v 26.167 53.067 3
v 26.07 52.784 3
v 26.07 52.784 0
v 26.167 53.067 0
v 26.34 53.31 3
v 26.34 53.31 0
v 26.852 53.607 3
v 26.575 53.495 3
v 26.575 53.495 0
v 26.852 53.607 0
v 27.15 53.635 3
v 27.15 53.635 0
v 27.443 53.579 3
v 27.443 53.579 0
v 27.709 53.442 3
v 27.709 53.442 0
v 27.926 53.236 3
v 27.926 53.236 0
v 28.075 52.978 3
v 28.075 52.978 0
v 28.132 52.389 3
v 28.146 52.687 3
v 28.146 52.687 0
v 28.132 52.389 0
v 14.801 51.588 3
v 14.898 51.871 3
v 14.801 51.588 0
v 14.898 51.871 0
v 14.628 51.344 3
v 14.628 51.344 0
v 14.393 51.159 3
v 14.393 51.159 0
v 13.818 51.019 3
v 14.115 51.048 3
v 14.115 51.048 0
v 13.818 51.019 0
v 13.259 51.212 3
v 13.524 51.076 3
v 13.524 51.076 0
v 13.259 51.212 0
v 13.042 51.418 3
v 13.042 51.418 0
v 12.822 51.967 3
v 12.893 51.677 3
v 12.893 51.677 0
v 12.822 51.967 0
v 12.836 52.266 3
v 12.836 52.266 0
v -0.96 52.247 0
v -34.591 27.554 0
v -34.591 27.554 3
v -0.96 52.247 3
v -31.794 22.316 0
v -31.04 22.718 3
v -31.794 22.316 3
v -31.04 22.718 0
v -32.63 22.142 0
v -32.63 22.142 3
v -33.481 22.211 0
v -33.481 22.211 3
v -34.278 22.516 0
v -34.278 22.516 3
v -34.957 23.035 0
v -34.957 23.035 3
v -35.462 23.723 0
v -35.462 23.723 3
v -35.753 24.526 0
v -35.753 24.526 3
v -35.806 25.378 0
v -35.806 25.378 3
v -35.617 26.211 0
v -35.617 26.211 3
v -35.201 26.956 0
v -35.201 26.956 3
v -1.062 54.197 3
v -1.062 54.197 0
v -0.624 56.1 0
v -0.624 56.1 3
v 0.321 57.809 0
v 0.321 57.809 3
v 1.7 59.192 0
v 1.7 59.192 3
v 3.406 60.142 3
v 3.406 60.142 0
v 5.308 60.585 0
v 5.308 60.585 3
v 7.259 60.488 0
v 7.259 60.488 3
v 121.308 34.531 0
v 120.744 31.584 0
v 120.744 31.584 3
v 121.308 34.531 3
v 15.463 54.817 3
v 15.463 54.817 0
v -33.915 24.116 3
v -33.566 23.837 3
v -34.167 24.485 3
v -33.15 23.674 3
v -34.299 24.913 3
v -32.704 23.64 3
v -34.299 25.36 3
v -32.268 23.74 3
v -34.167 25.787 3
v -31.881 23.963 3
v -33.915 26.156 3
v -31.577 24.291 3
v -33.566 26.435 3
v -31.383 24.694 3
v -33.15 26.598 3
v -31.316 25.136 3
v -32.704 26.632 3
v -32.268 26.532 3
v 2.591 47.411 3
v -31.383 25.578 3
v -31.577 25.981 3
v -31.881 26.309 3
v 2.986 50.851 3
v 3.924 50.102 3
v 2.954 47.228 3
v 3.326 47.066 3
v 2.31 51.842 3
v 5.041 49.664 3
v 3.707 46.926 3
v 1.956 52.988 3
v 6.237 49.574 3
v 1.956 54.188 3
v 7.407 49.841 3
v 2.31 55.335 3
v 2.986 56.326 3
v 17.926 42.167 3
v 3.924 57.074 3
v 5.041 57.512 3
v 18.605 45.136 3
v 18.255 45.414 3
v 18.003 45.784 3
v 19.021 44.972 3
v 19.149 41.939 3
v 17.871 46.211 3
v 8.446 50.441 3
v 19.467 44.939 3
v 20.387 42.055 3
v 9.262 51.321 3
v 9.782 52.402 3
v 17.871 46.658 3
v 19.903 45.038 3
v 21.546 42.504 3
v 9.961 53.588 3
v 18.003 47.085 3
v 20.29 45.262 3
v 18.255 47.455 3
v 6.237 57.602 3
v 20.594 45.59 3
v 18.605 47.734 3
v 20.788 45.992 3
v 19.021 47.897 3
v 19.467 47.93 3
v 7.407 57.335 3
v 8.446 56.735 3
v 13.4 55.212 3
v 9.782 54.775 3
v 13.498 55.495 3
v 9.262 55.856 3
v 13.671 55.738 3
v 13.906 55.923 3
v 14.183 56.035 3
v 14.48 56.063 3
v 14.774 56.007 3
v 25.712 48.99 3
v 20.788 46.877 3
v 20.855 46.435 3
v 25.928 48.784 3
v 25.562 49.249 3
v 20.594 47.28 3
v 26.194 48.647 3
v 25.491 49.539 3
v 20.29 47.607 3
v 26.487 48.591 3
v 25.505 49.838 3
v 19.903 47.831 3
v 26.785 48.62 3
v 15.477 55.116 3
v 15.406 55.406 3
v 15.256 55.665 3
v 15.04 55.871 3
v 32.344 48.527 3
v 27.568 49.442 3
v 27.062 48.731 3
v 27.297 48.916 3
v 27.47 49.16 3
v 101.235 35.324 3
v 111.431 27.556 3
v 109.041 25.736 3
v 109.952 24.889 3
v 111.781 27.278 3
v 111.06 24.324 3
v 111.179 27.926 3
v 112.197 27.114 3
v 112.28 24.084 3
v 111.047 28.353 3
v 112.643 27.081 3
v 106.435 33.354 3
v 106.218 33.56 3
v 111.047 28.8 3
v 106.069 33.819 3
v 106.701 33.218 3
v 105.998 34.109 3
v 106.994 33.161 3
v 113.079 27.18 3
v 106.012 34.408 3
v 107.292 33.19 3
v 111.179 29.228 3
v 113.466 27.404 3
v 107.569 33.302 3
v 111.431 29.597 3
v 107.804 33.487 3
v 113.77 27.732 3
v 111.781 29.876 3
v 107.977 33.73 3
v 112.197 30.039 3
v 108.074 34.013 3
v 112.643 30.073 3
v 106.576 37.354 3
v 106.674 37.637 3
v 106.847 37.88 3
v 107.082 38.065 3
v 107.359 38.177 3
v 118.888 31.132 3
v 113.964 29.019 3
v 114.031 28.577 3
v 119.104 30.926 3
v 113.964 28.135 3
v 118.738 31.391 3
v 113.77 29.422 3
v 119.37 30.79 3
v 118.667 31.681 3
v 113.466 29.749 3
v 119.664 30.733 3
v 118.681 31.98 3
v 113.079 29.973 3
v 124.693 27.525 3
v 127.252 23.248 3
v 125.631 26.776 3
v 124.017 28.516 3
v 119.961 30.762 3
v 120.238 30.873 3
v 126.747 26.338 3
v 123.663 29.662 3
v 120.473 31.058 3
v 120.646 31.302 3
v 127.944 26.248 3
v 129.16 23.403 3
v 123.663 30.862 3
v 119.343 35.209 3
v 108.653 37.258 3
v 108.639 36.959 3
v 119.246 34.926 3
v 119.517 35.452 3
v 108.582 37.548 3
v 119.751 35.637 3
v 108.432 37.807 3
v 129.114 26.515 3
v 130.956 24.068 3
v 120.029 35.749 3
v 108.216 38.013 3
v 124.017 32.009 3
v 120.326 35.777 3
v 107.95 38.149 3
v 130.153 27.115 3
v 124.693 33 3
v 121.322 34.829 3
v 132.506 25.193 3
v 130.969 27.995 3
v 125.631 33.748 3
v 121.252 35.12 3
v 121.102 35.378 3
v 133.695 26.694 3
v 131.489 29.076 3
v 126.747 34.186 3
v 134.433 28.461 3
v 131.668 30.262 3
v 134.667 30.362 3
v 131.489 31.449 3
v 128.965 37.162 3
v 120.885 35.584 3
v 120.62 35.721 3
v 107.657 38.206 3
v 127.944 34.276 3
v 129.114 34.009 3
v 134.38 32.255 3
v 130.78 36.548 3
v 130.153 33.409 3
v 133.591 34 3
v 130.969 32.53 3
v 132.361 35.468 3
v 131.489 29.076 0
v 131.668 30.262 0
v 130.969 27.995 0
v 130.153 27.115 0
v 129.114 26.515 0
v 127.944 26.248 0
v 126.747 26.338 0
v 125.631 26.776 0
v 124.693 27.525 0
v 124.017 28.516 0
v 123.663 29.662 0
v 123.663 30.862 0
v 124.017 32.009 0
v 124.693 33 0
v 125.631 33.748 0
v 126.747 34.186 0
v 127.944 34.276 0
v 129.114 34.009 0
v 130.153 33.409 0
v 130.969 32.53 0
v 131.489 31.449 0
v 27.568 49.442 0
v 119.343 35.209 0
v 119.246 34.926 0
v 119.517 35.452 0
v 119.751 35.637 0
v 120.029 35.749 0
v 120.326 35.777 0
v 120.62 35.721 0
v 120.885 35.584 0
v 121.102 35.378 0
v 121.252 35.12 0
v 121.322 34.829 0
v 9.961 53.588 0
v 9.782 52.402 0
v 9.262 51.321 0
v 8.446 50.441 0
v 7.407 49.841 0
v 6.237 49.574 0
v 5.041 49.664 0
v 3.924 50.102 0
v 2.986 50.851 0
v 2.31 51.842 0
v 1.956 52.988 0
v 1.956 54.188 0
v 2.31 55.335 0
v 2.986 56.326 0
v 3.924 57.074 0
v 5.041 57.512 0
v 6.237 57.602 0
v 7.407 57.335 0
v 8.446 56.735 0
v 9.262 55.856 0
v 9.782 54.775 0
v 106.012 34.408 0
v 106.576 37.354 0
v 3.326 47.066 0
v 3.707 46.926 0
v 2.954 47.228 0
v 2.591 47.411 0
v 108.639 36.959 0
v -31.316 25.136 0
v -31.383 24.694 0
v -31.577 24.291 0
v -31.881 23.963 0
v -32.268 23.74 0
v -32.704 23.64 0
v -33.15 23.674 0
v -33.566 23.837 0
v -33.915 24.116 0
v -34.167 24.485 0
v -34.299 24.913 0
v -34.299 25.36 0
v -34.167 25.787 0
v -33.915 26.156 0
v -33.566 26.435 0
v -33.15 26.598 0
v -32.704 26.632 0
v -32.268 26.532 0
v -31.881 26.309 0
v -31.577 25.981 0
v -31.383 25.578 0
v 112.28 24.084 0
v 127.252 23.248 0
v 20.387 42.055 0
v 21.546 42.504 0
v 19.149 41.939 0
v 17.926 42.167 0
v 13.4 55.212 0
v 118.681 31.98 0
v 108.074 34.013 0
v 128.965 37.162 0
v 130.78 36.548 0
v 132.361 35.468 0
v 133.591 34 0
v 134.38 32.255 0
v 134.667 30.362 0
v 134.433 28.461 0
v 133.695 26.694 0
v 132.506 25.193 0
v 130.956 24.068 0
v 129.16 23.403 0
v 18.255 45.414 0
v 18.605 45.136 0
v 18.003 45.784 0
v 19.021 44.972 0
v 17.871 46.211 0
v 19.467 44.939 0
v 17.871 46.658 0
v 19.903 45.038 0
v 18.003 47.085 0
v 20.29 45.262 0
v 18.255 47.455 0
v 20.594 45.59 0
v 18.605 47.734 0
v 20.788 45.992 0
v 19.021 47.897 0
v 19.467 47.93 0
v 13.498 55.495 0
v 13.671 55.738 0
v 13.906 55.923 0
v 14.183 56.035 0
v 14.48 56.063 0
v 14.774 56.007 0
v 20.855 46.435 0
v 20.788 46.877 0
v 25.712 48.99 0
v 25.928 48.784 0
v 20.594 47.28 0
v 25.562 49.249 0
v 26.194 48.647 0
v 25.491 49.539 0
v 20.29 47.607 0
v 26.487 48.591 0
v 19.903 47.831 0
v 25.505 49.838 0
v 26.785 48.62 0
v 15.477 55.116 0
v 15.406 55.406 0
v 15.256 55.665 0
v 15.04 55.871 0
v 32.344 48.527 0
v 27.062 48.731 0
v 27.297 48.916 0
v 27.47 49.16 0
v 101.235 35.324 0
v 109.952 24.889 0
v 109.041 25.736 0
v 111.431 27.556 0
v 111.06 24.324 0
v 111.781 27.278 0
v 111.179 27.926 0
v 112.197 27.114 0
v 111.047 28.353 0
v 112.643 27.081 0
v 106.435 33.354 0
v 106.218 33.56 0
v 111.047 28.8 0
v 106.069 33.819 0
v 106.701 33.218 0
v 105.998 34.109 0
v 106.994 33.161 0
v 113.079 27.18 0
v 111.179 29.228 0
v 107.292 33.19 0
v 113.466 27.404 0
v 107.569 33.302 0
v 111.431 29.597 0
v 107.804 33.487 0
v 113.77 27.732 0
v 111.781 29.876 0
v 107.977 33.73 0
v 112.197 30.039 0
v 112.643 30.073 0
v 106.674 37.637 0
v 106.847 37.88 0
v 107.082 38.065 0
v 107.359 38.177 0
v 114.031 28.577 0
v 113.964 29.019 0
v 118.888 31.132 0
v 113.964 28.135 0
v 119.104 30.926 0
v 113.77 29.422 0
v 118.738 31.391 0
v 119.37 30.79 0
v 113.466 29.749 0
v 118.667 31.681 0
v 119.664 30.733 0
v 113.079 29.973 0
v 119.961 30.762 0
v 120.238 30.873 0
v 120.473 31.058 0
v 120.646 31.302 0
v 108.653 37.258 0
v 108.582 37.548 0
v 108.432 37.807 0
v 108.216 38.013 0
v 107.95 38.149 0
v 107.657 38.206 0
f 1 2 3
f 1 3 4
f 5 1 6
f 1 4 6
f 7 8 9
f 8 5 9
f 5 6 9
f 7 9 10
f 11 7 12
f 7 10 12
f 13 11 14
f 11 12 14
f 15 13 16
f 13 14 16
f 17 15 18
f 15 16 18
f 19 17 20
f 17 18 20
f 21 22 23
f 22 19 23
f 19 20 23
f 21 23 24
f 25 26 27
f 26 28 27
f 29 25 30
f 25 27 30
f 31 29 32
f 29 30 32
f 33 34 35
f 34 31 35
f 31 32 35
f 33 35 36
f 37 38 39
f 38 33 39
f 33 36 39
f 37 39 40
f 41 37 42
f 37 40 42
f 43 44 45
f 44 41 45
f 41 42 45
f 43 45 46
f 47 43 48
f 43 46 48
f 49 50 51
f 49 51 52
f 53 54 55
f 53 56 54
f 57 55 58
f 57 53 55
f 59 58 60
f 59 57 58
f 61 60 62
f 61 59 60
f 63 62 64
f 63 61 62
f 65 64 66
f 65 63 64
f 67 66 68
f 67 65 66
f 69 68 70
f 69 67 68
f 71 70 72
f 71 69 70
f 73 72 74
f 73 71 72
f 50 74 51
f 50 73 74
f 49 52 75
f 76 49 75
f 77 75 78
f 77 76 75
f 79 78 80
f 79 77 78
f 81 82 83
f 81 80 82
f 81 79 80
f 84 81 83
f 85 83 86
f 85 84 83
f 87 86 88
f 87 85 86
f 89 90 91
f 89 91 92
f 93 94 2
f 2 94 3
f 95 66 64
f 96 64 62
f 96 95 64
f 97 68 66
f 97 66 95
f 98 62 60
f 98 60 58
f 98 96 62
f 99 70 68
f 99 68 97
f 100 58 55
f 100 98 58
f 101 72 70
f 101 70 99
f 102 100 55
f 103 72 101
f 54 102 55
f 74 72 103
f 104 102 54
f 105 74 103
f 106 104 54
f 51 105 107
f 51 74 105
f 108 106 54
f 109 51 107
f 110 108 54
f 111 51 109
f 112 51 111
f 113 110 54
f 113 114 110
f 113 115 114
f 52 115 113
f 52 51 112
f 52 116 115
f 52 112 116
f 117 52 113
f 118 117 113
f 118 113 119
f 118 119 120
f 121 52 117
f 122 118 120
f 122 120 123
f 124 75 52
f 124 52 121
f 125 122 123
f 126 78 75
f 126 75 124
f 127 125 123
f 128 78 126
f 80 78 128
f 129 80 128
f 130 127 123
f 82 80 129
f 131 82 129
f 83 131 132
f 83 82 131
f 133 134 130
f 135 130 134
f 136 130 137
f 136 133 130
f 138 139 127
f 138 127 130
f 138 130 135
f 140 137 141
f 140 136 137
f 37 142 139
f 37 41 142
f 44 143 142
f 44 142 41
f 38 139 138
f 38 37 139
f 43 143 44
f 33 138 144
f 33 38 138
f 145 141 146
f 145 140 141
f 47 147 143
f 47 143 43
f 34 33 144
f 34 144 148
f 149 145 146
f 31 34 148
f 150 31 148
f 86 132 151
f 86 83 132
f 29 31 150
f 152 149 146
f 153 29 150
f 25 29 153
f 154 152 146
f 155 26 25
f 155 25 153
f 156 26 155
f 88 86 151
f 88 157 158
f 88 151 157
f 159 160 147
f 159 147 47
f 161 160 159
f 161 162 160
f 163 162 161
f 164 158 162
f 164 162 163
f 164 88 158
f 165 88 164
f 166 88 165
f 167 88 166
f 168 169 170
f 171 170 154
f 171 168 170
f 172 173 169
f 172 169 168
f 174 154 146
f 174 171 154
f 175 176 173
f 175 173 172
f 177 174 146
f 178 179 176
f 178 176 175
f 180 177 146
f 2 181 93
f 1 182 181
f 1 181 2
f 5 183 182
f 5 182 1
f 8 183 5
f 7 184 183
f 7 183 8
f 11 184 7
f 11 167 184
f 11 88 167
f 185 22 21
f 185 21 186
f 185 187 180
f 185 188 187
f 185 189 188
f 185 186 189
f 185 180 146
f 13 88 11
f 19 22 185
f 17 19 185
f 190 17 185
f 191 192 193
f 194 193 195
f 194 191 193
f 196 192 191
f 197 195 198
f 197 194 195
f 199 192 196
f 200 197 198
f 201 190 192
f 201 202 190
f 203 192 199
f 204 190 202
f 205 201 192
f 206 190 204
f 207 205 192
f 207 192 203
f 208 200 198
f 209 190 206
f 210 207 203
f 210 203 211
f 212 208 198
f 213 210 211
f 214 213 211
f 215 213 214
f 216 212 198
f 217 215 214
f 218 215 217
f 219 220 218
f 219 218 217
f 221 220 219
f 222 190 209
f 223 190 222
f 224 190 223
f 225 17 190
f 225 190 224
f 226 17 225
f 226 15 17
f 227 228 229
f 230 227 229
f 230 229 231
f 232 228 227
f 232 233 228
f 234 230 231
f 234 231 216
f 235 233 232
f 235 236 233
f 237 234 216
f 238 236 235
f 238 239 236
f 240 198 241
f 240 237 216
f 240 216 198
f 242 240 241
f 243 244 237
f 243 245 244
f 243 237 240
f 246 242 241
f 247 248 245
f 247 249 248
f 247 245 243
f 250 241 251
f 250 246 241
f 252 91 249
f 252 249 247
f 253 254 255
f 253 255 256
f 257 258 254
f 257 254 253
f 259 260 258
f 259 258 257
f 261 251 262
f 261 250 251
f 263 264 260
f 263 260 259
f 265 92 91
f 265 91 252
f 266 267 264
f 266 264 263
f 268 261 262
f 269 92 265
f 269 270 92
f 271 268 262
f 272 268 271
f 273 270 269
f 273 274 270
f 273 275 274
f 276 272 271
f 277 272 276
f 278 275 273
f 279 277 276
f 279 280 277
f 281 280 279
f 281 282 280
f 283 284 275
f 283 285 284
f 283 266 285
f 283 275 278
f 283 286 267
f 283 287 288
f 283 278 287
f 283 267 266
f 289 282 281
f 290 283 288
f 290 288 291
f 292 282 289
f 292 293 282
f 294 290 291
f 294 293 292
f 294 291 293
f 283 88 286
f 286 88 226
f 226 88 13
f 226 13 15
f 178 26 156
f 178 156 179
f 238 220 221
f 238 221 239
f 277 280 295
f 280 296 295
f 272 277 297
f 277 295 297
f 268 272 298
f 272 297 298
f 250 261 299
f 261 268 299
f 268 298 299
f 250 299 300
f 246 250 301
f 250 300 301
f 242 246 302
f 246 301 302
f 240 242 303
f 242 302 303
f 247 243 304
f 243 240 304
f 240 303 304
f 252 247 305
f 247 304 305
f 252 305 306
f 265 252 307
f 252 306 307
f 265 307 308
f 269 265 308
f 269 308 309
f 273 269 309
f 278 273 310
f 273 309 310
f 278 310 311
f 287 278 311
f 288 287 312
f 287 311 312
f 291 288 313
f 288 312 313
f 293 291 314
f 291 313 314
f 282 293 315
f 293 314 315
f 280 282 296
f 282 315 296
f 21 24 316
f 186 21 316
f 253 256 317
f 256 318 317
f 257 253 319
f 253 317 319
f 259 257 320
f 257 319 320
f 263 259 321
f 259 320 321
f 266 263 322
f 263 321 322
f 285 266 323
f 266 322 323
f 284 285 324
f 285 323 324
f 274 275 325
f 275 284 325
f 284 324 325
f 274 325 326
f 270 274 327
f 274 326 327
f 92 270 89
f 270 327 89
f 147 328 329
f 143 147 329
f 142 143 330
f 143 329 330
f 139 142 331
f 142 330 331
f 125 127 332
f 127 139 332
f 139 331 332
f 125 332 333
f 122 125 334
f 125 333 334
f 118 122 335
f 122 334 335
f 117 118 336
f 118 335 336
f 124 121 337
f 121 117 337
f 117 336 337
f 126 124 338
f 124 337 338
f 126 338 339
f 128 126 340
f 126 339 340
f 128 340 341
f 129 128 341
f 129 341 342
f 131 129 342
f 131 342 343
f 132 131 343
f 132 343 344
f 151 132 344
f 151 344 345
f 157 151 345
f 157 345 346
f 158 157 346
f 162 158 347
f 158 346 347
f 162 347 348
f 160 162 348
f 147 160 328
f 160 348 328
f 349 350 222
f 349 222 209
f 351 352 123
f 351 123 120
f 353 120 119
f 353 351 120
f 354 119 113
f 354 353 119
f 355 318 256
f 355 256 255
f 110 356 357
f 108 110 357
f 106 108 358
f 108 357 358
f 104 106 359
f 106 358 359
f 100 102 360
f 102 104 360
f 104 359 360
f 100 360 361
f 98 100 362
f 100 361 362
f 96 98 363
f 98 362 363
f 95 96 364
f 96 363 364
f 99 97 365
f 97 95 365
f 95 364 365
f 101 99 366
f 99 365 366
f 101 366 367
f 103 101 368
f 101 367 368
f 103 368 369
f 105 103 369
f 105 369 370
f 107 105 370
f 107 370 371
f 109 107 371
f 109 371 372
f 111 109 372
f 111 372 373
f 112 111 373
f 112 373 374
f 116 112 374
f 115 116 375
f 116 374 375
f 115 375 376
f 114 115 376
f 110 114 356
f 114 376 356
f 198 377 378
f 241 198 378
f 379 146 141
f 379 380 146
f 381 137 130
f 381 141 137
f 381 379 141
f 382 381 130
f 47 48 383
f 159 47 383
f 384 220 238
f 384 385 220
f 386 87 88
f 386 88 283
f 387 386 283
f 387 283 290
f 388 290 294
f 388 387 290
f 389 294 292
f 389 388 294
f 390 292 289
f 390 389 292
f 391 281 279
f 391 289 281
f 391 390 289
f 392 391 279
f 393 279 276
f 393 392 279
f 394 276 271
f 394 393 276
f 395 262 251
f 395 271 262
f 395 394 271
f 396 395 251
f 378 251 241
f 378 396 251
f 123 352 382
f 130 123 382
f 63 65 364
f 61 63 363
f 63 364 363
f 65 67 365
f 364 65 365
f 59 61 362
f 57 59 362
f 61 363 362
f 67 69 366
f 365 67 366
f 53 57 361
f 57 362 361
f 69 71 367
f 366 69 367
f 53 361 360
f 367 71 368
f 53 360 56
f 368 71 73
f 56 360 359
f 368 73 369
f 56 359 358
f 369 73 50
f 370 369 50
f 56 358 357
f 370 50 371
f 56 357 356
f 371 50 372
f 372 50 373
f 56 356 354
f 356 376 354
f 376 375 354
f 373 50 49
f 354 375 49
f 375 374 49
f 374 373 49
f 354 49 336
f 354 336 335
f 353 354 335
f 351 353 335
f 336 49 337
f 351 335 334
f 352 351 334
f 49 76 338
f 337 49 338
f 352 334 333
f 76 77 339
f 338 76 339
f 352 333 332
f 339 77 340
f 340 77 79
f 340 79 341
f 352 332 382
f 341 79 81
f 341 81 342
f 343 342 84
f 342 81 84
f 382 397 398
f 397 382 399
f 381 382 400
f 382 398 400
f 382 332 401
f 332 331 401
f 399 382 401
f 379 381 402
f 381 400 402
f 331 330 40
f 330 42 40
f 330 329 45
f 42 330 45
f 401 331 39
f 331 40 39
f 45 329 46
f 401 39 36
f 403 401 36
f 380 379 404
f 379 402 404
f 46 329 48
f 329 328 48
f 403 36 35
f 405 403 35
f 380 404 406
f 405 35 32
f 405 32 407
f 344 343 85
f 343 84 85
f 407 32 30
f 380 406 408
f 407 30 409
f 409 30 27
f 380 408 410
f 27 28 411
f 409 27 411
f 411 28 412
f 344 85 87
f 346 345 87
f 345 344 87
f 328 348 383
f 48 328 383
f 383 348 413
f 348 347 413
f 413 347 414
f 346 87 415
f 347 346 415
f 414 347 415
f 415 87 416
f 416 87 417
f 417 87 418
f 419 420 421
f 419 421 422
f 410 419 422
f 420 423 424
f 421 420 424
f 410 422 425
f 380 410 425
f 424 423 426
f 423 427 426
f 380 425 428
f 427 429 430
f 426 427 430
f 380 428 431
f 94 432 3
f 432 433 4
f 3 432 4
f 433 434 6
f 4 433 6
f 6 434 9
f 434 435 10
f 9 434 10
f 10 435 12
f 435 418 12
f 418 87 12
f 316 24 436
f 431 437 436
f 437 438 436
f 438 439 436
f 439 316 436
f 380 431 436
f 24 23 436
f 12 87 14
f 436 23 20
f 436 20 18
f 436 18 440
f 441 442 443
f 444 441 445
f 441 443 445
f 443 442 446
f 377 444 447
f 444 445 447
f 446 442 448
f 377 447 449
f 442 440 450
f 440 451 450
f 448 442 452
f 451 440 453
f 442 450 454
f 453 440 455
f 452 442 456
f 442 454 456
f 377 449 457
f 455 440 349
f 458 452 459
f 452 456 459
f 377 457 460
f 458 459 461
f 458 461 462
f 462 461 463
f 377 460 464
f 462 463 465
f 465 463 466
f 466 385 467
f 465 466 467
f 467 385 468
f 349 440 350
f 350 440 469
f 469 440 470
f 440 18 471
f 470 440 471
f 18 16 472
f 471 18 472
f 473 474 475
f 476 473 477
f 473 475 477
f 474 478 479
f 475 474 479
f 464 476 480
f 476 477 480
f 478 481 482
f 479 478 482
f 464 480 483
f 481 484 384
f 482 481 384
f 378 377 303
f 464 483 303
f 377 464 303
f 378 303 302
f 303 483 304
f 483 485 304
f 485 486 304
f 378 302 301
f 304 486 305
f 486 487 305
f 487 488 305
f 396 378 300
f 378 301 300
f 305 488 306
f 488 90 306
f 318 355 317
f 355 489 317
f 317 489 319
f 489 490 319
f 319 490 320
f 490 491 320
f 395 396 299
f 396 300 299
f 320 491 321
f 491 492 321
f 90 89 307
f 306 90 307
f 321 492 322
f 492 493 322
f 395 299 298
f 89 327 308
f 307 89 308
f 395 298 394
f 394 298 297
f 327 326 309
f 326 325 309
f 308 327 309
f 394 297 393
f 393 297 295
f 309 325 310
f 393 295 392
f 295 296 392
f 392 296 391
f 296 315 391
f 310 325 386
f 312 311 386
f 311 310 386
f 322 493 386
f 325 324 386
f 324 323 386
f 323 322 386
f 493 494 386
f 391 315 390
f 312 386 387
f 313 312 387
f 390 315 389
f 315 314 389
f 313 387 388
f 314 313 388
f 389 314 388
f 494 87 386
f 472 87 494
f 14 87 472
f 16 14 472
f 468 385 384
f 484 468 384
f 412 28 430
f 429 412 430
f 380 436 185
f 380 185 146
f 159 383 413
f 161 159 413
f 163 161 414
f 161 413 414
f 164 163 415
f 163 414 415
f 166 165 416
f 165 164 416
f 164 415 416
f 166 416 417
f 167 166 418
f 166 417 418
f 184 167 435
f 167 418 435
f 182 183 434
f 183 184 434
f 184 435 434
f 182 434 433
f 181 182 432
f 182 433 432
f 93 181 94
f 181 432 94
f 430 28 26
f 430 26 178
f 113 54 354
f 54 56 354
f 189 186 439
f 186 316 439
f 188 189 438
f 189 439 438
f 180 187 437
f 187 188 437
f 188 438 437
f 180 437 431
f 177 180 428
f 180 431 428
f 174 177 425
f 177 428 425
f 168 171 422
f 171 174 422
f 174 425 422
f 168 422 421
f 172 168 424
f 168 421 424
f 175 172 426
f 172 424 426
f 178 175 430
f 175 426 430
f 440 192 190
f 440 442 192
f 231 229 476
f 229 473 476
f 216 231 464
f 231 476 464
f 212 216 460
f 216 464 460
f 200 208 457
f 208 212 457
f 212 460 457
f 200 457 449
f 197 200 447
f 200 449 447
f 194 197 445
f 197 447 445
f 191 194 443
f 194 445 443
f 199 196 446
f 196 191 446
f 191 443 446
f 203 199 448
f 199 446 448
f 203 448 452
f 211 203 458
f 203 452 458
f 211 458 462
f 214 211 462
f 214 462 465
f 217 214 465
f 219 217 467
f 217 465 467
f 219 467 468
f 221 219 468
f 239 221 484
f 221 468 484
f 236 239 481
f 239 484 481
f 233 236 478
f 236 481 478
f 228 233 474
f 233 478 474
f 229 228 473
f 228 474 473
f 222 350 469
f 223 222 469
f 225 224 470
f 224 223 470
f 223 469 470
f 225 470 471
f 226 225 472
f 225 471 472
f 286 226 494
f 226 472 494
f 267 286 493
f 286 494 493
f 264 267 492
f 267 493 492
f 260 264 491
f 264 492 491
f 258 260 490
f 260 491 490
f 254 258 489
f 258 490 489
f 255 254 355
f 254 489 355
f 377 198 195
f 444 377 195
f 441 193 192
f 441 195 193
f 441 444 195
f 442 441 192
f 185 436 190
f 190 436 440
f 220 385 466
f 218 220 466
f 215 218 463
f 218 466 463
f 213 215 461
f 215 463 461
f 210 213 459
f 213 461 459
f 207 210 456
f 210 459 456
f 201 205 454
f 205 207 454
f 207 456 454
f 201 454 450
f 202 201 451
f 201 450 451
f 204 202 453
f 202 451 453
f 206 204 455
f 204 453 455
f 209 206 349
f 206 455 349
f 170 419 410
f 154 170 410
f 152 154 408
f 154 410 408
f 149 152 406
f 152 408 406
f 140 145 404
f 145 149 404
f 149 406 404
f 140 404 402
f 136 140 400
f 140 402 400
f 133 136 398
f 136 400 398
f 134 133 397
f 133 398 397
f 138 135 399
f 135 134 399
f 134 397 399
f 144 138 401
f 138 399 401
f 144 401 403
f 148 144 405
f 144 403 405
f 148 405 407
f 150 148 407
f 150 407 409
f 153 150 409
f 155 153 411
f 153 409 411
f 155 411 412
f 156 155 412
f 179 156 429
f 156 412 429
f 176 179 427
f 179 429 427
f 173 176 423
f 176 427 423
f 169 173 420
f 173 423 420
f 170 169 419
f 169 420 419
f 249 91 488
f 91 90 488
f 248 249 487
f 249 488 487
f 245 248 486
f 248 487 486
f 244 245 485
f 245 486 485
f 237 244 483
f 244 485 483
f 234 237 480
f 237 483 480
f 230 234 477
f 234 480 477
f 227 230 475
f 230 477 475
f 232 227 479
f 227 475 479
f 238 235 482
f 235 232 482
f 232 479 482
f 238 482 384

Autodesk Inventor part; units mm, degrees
ref_plane "YZ Plane" through (0, 0, 0) normal (1, 0, 0) x (0, 1, 0)
ref_plane "XZ Plane" through (0, 0, 0) normal (0, 1, 0) x (-1, 0, 0)
ref_plane "XY Plane" through (0, 0, 0) normal (0, 0, 1) x (1, 0, 0)
sketch "スケッチ2" plane through (0, 0, 0) normal (0, 0, 1) x (1, 0, 0)
  circle A0 centre (127.6431, 30.2622) radius 1.5
  circle A1 centre (5.9362, 53.5882) radius 1.5
  line L0 (5.9362, 53.5882) -> (127.6431, 30.2622) construction
  circle A2 centre (5.9362, 53.5882) radius 4.025
  circle A3 centre (127.6431, 30.2622) radius 4.025
  arc A4 (127.2517, 23.2481) -> (128.9655, 37.1616) centre (127.6431, 30.2622) ccw
  line L1 (12.8357, 52.2659) -> (13.4004, 55.2122)
  line L2 (15.4628, 54.817) -> (26.0698, 52.7841)
  line L3 (28.1322, 52.3888) -> (27.5675, 49.4424)
  line L4 (14.8981, 51.8706) -> (25.5051, 49.8377)
  line L5 (120.7437, 31.5845) -> (121.3084, 34.5309)
  line L6 (119.246, 34.9262) -> (108.639, 36.9591)
  line L7 (106.5765, 37.3543) -> (106.0119, 34.408)
  line L8 (108.0743, 34.0127) -> (118.6813, 31.9798)
  circle A5 centre (19.3546, 46.4346) radius 3
  circle A6 centre (112.5307, 28.5767) radius 3
  line L9 (7.2586, 60.4876) -> (128.9655, 37.1616)
  arc A7 (17.9263, 42.1672) -> (21.5465, 42.5045) centre (19.3546, 46.4346) ccw
  arc A8 (109.041, 25.7356) -> (112.28, 24.0837) centre (112.5307, 28.5767) ccw
  line L10 (3.7066, 46.9264) -> (17.9263, 42.1672)
  line L11 (112.28, 24.0837) -> (127.2517, 23.2481)
  circle A9 centre (19.3546, 46.4346) radius 1.5
  circle A10 centre (112.5307, 28.5767) radius 1.5
  line L12 (32.3442, 48.5269) -> (21.5465, 42.5045)
  line L13 (109.041, 25.7356) -> (101.2351, 35.3235)
  line L14 (32.3442, 48.5269) -> (101.2351, 35.3235)
  arc A11 (108.639, 36.9591) -> (106.5765, 37.3543) centre (107.6078, 37.1567) ccw
  arc A12 (106.0119, 34.408) -> (108.0743, 34.0127) centre (107.0431, 34.2103) ccw
  arc A13 (121.3084, 34.5309) -> (119.246, 34.9262) centre (120.2772, 34.7285) ccw
  arc A14 (118.6813, 31.9798) -> (120.7437, 31.5845) centre (119.7125, 31.7821) ccw
  arc A15 (28.1322, 52.3888) -> (26.0698, 52.7841) centre (27.101, 52.5864) ccw
  arc A16 (25.5051, 49.8377) -> (27.5675, 49.4424) centre (26.5363, 49.64) ccw
  arc A17 (15.4628, 54.817) -> (13.4004, 55.2122) centre (14.4316, 55.0146) ccw
  arc A18 (12.8357, 52.2659) -> (14.8981, 51.8706) centre (13.8669, 52.0682) ccw
  line L15 (5.9362, 53.5882) -> (-32.8159, 25.1361) construction
  circle A19 centre (-32.8159, 25.1361) radius 1.5
  arc A20 (-34.5914, 27.5543) -> (-31.0404, 22.7179) centre (-32.8159, 25.1361) ccw
  line L16 (-34.5914, 27.5543) -> (-0.9595, 52.247)
  line L17 (-31.0404, 22.7179) -> (2.5914, 47.4106)
  arc A21 (7.2586, 60.4876) -> (-0.9595, 52.247) centre (5.9362, 53.5882) ccw
  arc A22 (2.5914, 47.4106) -> (3.7066, 46.9264) centre (5.9362, 53.5882) ccw
  point P0 (0, 0)
  point P1 (0, 0)
  dimension "d31" = 8.05
  dimension "d32" = 8.05
  dimension "d33" = 3
  dimension "d34" = 3
  dimension "d35" = 15
  dimension "d36" = 3
  dimension "d37" = 15
  dimension "d38" = 6
  dimension "d39" = 6
  dimension "d40" = 9
  dimension "d41" = 9
  dimension "d42" = 3
  dimension "d43" = 3
  dimension "d44" = 7.5
  dimension "d45" = 7.5
  dimension "d46" = 40
  dimension "d47" = 40
  dimension "d48" = 2.1
  dimension "d49" = 2.1
  dimension "d50" = 2.1
  dimension "d51" = 2.1
  dimension "d52" = 2.1
  dimension "d53" = 2.1
  dimension "d54" = 2.1
  dimension "d55" = 2.1
  dimension "d56" = 3
  dimension "d57" = 6
  dimension "d58" = 3
  dimension "d59" = 3
extrude "押し出し2" add sketch "スケッチ2" along normal blind 3 contours L11 A8 L13 L14 L12 A7 L10 A22 L17 A20 L16 A21 L9 A4 | A5 | A6
equation "\"d47\" = d46"
properties part number "台形サスバー"
